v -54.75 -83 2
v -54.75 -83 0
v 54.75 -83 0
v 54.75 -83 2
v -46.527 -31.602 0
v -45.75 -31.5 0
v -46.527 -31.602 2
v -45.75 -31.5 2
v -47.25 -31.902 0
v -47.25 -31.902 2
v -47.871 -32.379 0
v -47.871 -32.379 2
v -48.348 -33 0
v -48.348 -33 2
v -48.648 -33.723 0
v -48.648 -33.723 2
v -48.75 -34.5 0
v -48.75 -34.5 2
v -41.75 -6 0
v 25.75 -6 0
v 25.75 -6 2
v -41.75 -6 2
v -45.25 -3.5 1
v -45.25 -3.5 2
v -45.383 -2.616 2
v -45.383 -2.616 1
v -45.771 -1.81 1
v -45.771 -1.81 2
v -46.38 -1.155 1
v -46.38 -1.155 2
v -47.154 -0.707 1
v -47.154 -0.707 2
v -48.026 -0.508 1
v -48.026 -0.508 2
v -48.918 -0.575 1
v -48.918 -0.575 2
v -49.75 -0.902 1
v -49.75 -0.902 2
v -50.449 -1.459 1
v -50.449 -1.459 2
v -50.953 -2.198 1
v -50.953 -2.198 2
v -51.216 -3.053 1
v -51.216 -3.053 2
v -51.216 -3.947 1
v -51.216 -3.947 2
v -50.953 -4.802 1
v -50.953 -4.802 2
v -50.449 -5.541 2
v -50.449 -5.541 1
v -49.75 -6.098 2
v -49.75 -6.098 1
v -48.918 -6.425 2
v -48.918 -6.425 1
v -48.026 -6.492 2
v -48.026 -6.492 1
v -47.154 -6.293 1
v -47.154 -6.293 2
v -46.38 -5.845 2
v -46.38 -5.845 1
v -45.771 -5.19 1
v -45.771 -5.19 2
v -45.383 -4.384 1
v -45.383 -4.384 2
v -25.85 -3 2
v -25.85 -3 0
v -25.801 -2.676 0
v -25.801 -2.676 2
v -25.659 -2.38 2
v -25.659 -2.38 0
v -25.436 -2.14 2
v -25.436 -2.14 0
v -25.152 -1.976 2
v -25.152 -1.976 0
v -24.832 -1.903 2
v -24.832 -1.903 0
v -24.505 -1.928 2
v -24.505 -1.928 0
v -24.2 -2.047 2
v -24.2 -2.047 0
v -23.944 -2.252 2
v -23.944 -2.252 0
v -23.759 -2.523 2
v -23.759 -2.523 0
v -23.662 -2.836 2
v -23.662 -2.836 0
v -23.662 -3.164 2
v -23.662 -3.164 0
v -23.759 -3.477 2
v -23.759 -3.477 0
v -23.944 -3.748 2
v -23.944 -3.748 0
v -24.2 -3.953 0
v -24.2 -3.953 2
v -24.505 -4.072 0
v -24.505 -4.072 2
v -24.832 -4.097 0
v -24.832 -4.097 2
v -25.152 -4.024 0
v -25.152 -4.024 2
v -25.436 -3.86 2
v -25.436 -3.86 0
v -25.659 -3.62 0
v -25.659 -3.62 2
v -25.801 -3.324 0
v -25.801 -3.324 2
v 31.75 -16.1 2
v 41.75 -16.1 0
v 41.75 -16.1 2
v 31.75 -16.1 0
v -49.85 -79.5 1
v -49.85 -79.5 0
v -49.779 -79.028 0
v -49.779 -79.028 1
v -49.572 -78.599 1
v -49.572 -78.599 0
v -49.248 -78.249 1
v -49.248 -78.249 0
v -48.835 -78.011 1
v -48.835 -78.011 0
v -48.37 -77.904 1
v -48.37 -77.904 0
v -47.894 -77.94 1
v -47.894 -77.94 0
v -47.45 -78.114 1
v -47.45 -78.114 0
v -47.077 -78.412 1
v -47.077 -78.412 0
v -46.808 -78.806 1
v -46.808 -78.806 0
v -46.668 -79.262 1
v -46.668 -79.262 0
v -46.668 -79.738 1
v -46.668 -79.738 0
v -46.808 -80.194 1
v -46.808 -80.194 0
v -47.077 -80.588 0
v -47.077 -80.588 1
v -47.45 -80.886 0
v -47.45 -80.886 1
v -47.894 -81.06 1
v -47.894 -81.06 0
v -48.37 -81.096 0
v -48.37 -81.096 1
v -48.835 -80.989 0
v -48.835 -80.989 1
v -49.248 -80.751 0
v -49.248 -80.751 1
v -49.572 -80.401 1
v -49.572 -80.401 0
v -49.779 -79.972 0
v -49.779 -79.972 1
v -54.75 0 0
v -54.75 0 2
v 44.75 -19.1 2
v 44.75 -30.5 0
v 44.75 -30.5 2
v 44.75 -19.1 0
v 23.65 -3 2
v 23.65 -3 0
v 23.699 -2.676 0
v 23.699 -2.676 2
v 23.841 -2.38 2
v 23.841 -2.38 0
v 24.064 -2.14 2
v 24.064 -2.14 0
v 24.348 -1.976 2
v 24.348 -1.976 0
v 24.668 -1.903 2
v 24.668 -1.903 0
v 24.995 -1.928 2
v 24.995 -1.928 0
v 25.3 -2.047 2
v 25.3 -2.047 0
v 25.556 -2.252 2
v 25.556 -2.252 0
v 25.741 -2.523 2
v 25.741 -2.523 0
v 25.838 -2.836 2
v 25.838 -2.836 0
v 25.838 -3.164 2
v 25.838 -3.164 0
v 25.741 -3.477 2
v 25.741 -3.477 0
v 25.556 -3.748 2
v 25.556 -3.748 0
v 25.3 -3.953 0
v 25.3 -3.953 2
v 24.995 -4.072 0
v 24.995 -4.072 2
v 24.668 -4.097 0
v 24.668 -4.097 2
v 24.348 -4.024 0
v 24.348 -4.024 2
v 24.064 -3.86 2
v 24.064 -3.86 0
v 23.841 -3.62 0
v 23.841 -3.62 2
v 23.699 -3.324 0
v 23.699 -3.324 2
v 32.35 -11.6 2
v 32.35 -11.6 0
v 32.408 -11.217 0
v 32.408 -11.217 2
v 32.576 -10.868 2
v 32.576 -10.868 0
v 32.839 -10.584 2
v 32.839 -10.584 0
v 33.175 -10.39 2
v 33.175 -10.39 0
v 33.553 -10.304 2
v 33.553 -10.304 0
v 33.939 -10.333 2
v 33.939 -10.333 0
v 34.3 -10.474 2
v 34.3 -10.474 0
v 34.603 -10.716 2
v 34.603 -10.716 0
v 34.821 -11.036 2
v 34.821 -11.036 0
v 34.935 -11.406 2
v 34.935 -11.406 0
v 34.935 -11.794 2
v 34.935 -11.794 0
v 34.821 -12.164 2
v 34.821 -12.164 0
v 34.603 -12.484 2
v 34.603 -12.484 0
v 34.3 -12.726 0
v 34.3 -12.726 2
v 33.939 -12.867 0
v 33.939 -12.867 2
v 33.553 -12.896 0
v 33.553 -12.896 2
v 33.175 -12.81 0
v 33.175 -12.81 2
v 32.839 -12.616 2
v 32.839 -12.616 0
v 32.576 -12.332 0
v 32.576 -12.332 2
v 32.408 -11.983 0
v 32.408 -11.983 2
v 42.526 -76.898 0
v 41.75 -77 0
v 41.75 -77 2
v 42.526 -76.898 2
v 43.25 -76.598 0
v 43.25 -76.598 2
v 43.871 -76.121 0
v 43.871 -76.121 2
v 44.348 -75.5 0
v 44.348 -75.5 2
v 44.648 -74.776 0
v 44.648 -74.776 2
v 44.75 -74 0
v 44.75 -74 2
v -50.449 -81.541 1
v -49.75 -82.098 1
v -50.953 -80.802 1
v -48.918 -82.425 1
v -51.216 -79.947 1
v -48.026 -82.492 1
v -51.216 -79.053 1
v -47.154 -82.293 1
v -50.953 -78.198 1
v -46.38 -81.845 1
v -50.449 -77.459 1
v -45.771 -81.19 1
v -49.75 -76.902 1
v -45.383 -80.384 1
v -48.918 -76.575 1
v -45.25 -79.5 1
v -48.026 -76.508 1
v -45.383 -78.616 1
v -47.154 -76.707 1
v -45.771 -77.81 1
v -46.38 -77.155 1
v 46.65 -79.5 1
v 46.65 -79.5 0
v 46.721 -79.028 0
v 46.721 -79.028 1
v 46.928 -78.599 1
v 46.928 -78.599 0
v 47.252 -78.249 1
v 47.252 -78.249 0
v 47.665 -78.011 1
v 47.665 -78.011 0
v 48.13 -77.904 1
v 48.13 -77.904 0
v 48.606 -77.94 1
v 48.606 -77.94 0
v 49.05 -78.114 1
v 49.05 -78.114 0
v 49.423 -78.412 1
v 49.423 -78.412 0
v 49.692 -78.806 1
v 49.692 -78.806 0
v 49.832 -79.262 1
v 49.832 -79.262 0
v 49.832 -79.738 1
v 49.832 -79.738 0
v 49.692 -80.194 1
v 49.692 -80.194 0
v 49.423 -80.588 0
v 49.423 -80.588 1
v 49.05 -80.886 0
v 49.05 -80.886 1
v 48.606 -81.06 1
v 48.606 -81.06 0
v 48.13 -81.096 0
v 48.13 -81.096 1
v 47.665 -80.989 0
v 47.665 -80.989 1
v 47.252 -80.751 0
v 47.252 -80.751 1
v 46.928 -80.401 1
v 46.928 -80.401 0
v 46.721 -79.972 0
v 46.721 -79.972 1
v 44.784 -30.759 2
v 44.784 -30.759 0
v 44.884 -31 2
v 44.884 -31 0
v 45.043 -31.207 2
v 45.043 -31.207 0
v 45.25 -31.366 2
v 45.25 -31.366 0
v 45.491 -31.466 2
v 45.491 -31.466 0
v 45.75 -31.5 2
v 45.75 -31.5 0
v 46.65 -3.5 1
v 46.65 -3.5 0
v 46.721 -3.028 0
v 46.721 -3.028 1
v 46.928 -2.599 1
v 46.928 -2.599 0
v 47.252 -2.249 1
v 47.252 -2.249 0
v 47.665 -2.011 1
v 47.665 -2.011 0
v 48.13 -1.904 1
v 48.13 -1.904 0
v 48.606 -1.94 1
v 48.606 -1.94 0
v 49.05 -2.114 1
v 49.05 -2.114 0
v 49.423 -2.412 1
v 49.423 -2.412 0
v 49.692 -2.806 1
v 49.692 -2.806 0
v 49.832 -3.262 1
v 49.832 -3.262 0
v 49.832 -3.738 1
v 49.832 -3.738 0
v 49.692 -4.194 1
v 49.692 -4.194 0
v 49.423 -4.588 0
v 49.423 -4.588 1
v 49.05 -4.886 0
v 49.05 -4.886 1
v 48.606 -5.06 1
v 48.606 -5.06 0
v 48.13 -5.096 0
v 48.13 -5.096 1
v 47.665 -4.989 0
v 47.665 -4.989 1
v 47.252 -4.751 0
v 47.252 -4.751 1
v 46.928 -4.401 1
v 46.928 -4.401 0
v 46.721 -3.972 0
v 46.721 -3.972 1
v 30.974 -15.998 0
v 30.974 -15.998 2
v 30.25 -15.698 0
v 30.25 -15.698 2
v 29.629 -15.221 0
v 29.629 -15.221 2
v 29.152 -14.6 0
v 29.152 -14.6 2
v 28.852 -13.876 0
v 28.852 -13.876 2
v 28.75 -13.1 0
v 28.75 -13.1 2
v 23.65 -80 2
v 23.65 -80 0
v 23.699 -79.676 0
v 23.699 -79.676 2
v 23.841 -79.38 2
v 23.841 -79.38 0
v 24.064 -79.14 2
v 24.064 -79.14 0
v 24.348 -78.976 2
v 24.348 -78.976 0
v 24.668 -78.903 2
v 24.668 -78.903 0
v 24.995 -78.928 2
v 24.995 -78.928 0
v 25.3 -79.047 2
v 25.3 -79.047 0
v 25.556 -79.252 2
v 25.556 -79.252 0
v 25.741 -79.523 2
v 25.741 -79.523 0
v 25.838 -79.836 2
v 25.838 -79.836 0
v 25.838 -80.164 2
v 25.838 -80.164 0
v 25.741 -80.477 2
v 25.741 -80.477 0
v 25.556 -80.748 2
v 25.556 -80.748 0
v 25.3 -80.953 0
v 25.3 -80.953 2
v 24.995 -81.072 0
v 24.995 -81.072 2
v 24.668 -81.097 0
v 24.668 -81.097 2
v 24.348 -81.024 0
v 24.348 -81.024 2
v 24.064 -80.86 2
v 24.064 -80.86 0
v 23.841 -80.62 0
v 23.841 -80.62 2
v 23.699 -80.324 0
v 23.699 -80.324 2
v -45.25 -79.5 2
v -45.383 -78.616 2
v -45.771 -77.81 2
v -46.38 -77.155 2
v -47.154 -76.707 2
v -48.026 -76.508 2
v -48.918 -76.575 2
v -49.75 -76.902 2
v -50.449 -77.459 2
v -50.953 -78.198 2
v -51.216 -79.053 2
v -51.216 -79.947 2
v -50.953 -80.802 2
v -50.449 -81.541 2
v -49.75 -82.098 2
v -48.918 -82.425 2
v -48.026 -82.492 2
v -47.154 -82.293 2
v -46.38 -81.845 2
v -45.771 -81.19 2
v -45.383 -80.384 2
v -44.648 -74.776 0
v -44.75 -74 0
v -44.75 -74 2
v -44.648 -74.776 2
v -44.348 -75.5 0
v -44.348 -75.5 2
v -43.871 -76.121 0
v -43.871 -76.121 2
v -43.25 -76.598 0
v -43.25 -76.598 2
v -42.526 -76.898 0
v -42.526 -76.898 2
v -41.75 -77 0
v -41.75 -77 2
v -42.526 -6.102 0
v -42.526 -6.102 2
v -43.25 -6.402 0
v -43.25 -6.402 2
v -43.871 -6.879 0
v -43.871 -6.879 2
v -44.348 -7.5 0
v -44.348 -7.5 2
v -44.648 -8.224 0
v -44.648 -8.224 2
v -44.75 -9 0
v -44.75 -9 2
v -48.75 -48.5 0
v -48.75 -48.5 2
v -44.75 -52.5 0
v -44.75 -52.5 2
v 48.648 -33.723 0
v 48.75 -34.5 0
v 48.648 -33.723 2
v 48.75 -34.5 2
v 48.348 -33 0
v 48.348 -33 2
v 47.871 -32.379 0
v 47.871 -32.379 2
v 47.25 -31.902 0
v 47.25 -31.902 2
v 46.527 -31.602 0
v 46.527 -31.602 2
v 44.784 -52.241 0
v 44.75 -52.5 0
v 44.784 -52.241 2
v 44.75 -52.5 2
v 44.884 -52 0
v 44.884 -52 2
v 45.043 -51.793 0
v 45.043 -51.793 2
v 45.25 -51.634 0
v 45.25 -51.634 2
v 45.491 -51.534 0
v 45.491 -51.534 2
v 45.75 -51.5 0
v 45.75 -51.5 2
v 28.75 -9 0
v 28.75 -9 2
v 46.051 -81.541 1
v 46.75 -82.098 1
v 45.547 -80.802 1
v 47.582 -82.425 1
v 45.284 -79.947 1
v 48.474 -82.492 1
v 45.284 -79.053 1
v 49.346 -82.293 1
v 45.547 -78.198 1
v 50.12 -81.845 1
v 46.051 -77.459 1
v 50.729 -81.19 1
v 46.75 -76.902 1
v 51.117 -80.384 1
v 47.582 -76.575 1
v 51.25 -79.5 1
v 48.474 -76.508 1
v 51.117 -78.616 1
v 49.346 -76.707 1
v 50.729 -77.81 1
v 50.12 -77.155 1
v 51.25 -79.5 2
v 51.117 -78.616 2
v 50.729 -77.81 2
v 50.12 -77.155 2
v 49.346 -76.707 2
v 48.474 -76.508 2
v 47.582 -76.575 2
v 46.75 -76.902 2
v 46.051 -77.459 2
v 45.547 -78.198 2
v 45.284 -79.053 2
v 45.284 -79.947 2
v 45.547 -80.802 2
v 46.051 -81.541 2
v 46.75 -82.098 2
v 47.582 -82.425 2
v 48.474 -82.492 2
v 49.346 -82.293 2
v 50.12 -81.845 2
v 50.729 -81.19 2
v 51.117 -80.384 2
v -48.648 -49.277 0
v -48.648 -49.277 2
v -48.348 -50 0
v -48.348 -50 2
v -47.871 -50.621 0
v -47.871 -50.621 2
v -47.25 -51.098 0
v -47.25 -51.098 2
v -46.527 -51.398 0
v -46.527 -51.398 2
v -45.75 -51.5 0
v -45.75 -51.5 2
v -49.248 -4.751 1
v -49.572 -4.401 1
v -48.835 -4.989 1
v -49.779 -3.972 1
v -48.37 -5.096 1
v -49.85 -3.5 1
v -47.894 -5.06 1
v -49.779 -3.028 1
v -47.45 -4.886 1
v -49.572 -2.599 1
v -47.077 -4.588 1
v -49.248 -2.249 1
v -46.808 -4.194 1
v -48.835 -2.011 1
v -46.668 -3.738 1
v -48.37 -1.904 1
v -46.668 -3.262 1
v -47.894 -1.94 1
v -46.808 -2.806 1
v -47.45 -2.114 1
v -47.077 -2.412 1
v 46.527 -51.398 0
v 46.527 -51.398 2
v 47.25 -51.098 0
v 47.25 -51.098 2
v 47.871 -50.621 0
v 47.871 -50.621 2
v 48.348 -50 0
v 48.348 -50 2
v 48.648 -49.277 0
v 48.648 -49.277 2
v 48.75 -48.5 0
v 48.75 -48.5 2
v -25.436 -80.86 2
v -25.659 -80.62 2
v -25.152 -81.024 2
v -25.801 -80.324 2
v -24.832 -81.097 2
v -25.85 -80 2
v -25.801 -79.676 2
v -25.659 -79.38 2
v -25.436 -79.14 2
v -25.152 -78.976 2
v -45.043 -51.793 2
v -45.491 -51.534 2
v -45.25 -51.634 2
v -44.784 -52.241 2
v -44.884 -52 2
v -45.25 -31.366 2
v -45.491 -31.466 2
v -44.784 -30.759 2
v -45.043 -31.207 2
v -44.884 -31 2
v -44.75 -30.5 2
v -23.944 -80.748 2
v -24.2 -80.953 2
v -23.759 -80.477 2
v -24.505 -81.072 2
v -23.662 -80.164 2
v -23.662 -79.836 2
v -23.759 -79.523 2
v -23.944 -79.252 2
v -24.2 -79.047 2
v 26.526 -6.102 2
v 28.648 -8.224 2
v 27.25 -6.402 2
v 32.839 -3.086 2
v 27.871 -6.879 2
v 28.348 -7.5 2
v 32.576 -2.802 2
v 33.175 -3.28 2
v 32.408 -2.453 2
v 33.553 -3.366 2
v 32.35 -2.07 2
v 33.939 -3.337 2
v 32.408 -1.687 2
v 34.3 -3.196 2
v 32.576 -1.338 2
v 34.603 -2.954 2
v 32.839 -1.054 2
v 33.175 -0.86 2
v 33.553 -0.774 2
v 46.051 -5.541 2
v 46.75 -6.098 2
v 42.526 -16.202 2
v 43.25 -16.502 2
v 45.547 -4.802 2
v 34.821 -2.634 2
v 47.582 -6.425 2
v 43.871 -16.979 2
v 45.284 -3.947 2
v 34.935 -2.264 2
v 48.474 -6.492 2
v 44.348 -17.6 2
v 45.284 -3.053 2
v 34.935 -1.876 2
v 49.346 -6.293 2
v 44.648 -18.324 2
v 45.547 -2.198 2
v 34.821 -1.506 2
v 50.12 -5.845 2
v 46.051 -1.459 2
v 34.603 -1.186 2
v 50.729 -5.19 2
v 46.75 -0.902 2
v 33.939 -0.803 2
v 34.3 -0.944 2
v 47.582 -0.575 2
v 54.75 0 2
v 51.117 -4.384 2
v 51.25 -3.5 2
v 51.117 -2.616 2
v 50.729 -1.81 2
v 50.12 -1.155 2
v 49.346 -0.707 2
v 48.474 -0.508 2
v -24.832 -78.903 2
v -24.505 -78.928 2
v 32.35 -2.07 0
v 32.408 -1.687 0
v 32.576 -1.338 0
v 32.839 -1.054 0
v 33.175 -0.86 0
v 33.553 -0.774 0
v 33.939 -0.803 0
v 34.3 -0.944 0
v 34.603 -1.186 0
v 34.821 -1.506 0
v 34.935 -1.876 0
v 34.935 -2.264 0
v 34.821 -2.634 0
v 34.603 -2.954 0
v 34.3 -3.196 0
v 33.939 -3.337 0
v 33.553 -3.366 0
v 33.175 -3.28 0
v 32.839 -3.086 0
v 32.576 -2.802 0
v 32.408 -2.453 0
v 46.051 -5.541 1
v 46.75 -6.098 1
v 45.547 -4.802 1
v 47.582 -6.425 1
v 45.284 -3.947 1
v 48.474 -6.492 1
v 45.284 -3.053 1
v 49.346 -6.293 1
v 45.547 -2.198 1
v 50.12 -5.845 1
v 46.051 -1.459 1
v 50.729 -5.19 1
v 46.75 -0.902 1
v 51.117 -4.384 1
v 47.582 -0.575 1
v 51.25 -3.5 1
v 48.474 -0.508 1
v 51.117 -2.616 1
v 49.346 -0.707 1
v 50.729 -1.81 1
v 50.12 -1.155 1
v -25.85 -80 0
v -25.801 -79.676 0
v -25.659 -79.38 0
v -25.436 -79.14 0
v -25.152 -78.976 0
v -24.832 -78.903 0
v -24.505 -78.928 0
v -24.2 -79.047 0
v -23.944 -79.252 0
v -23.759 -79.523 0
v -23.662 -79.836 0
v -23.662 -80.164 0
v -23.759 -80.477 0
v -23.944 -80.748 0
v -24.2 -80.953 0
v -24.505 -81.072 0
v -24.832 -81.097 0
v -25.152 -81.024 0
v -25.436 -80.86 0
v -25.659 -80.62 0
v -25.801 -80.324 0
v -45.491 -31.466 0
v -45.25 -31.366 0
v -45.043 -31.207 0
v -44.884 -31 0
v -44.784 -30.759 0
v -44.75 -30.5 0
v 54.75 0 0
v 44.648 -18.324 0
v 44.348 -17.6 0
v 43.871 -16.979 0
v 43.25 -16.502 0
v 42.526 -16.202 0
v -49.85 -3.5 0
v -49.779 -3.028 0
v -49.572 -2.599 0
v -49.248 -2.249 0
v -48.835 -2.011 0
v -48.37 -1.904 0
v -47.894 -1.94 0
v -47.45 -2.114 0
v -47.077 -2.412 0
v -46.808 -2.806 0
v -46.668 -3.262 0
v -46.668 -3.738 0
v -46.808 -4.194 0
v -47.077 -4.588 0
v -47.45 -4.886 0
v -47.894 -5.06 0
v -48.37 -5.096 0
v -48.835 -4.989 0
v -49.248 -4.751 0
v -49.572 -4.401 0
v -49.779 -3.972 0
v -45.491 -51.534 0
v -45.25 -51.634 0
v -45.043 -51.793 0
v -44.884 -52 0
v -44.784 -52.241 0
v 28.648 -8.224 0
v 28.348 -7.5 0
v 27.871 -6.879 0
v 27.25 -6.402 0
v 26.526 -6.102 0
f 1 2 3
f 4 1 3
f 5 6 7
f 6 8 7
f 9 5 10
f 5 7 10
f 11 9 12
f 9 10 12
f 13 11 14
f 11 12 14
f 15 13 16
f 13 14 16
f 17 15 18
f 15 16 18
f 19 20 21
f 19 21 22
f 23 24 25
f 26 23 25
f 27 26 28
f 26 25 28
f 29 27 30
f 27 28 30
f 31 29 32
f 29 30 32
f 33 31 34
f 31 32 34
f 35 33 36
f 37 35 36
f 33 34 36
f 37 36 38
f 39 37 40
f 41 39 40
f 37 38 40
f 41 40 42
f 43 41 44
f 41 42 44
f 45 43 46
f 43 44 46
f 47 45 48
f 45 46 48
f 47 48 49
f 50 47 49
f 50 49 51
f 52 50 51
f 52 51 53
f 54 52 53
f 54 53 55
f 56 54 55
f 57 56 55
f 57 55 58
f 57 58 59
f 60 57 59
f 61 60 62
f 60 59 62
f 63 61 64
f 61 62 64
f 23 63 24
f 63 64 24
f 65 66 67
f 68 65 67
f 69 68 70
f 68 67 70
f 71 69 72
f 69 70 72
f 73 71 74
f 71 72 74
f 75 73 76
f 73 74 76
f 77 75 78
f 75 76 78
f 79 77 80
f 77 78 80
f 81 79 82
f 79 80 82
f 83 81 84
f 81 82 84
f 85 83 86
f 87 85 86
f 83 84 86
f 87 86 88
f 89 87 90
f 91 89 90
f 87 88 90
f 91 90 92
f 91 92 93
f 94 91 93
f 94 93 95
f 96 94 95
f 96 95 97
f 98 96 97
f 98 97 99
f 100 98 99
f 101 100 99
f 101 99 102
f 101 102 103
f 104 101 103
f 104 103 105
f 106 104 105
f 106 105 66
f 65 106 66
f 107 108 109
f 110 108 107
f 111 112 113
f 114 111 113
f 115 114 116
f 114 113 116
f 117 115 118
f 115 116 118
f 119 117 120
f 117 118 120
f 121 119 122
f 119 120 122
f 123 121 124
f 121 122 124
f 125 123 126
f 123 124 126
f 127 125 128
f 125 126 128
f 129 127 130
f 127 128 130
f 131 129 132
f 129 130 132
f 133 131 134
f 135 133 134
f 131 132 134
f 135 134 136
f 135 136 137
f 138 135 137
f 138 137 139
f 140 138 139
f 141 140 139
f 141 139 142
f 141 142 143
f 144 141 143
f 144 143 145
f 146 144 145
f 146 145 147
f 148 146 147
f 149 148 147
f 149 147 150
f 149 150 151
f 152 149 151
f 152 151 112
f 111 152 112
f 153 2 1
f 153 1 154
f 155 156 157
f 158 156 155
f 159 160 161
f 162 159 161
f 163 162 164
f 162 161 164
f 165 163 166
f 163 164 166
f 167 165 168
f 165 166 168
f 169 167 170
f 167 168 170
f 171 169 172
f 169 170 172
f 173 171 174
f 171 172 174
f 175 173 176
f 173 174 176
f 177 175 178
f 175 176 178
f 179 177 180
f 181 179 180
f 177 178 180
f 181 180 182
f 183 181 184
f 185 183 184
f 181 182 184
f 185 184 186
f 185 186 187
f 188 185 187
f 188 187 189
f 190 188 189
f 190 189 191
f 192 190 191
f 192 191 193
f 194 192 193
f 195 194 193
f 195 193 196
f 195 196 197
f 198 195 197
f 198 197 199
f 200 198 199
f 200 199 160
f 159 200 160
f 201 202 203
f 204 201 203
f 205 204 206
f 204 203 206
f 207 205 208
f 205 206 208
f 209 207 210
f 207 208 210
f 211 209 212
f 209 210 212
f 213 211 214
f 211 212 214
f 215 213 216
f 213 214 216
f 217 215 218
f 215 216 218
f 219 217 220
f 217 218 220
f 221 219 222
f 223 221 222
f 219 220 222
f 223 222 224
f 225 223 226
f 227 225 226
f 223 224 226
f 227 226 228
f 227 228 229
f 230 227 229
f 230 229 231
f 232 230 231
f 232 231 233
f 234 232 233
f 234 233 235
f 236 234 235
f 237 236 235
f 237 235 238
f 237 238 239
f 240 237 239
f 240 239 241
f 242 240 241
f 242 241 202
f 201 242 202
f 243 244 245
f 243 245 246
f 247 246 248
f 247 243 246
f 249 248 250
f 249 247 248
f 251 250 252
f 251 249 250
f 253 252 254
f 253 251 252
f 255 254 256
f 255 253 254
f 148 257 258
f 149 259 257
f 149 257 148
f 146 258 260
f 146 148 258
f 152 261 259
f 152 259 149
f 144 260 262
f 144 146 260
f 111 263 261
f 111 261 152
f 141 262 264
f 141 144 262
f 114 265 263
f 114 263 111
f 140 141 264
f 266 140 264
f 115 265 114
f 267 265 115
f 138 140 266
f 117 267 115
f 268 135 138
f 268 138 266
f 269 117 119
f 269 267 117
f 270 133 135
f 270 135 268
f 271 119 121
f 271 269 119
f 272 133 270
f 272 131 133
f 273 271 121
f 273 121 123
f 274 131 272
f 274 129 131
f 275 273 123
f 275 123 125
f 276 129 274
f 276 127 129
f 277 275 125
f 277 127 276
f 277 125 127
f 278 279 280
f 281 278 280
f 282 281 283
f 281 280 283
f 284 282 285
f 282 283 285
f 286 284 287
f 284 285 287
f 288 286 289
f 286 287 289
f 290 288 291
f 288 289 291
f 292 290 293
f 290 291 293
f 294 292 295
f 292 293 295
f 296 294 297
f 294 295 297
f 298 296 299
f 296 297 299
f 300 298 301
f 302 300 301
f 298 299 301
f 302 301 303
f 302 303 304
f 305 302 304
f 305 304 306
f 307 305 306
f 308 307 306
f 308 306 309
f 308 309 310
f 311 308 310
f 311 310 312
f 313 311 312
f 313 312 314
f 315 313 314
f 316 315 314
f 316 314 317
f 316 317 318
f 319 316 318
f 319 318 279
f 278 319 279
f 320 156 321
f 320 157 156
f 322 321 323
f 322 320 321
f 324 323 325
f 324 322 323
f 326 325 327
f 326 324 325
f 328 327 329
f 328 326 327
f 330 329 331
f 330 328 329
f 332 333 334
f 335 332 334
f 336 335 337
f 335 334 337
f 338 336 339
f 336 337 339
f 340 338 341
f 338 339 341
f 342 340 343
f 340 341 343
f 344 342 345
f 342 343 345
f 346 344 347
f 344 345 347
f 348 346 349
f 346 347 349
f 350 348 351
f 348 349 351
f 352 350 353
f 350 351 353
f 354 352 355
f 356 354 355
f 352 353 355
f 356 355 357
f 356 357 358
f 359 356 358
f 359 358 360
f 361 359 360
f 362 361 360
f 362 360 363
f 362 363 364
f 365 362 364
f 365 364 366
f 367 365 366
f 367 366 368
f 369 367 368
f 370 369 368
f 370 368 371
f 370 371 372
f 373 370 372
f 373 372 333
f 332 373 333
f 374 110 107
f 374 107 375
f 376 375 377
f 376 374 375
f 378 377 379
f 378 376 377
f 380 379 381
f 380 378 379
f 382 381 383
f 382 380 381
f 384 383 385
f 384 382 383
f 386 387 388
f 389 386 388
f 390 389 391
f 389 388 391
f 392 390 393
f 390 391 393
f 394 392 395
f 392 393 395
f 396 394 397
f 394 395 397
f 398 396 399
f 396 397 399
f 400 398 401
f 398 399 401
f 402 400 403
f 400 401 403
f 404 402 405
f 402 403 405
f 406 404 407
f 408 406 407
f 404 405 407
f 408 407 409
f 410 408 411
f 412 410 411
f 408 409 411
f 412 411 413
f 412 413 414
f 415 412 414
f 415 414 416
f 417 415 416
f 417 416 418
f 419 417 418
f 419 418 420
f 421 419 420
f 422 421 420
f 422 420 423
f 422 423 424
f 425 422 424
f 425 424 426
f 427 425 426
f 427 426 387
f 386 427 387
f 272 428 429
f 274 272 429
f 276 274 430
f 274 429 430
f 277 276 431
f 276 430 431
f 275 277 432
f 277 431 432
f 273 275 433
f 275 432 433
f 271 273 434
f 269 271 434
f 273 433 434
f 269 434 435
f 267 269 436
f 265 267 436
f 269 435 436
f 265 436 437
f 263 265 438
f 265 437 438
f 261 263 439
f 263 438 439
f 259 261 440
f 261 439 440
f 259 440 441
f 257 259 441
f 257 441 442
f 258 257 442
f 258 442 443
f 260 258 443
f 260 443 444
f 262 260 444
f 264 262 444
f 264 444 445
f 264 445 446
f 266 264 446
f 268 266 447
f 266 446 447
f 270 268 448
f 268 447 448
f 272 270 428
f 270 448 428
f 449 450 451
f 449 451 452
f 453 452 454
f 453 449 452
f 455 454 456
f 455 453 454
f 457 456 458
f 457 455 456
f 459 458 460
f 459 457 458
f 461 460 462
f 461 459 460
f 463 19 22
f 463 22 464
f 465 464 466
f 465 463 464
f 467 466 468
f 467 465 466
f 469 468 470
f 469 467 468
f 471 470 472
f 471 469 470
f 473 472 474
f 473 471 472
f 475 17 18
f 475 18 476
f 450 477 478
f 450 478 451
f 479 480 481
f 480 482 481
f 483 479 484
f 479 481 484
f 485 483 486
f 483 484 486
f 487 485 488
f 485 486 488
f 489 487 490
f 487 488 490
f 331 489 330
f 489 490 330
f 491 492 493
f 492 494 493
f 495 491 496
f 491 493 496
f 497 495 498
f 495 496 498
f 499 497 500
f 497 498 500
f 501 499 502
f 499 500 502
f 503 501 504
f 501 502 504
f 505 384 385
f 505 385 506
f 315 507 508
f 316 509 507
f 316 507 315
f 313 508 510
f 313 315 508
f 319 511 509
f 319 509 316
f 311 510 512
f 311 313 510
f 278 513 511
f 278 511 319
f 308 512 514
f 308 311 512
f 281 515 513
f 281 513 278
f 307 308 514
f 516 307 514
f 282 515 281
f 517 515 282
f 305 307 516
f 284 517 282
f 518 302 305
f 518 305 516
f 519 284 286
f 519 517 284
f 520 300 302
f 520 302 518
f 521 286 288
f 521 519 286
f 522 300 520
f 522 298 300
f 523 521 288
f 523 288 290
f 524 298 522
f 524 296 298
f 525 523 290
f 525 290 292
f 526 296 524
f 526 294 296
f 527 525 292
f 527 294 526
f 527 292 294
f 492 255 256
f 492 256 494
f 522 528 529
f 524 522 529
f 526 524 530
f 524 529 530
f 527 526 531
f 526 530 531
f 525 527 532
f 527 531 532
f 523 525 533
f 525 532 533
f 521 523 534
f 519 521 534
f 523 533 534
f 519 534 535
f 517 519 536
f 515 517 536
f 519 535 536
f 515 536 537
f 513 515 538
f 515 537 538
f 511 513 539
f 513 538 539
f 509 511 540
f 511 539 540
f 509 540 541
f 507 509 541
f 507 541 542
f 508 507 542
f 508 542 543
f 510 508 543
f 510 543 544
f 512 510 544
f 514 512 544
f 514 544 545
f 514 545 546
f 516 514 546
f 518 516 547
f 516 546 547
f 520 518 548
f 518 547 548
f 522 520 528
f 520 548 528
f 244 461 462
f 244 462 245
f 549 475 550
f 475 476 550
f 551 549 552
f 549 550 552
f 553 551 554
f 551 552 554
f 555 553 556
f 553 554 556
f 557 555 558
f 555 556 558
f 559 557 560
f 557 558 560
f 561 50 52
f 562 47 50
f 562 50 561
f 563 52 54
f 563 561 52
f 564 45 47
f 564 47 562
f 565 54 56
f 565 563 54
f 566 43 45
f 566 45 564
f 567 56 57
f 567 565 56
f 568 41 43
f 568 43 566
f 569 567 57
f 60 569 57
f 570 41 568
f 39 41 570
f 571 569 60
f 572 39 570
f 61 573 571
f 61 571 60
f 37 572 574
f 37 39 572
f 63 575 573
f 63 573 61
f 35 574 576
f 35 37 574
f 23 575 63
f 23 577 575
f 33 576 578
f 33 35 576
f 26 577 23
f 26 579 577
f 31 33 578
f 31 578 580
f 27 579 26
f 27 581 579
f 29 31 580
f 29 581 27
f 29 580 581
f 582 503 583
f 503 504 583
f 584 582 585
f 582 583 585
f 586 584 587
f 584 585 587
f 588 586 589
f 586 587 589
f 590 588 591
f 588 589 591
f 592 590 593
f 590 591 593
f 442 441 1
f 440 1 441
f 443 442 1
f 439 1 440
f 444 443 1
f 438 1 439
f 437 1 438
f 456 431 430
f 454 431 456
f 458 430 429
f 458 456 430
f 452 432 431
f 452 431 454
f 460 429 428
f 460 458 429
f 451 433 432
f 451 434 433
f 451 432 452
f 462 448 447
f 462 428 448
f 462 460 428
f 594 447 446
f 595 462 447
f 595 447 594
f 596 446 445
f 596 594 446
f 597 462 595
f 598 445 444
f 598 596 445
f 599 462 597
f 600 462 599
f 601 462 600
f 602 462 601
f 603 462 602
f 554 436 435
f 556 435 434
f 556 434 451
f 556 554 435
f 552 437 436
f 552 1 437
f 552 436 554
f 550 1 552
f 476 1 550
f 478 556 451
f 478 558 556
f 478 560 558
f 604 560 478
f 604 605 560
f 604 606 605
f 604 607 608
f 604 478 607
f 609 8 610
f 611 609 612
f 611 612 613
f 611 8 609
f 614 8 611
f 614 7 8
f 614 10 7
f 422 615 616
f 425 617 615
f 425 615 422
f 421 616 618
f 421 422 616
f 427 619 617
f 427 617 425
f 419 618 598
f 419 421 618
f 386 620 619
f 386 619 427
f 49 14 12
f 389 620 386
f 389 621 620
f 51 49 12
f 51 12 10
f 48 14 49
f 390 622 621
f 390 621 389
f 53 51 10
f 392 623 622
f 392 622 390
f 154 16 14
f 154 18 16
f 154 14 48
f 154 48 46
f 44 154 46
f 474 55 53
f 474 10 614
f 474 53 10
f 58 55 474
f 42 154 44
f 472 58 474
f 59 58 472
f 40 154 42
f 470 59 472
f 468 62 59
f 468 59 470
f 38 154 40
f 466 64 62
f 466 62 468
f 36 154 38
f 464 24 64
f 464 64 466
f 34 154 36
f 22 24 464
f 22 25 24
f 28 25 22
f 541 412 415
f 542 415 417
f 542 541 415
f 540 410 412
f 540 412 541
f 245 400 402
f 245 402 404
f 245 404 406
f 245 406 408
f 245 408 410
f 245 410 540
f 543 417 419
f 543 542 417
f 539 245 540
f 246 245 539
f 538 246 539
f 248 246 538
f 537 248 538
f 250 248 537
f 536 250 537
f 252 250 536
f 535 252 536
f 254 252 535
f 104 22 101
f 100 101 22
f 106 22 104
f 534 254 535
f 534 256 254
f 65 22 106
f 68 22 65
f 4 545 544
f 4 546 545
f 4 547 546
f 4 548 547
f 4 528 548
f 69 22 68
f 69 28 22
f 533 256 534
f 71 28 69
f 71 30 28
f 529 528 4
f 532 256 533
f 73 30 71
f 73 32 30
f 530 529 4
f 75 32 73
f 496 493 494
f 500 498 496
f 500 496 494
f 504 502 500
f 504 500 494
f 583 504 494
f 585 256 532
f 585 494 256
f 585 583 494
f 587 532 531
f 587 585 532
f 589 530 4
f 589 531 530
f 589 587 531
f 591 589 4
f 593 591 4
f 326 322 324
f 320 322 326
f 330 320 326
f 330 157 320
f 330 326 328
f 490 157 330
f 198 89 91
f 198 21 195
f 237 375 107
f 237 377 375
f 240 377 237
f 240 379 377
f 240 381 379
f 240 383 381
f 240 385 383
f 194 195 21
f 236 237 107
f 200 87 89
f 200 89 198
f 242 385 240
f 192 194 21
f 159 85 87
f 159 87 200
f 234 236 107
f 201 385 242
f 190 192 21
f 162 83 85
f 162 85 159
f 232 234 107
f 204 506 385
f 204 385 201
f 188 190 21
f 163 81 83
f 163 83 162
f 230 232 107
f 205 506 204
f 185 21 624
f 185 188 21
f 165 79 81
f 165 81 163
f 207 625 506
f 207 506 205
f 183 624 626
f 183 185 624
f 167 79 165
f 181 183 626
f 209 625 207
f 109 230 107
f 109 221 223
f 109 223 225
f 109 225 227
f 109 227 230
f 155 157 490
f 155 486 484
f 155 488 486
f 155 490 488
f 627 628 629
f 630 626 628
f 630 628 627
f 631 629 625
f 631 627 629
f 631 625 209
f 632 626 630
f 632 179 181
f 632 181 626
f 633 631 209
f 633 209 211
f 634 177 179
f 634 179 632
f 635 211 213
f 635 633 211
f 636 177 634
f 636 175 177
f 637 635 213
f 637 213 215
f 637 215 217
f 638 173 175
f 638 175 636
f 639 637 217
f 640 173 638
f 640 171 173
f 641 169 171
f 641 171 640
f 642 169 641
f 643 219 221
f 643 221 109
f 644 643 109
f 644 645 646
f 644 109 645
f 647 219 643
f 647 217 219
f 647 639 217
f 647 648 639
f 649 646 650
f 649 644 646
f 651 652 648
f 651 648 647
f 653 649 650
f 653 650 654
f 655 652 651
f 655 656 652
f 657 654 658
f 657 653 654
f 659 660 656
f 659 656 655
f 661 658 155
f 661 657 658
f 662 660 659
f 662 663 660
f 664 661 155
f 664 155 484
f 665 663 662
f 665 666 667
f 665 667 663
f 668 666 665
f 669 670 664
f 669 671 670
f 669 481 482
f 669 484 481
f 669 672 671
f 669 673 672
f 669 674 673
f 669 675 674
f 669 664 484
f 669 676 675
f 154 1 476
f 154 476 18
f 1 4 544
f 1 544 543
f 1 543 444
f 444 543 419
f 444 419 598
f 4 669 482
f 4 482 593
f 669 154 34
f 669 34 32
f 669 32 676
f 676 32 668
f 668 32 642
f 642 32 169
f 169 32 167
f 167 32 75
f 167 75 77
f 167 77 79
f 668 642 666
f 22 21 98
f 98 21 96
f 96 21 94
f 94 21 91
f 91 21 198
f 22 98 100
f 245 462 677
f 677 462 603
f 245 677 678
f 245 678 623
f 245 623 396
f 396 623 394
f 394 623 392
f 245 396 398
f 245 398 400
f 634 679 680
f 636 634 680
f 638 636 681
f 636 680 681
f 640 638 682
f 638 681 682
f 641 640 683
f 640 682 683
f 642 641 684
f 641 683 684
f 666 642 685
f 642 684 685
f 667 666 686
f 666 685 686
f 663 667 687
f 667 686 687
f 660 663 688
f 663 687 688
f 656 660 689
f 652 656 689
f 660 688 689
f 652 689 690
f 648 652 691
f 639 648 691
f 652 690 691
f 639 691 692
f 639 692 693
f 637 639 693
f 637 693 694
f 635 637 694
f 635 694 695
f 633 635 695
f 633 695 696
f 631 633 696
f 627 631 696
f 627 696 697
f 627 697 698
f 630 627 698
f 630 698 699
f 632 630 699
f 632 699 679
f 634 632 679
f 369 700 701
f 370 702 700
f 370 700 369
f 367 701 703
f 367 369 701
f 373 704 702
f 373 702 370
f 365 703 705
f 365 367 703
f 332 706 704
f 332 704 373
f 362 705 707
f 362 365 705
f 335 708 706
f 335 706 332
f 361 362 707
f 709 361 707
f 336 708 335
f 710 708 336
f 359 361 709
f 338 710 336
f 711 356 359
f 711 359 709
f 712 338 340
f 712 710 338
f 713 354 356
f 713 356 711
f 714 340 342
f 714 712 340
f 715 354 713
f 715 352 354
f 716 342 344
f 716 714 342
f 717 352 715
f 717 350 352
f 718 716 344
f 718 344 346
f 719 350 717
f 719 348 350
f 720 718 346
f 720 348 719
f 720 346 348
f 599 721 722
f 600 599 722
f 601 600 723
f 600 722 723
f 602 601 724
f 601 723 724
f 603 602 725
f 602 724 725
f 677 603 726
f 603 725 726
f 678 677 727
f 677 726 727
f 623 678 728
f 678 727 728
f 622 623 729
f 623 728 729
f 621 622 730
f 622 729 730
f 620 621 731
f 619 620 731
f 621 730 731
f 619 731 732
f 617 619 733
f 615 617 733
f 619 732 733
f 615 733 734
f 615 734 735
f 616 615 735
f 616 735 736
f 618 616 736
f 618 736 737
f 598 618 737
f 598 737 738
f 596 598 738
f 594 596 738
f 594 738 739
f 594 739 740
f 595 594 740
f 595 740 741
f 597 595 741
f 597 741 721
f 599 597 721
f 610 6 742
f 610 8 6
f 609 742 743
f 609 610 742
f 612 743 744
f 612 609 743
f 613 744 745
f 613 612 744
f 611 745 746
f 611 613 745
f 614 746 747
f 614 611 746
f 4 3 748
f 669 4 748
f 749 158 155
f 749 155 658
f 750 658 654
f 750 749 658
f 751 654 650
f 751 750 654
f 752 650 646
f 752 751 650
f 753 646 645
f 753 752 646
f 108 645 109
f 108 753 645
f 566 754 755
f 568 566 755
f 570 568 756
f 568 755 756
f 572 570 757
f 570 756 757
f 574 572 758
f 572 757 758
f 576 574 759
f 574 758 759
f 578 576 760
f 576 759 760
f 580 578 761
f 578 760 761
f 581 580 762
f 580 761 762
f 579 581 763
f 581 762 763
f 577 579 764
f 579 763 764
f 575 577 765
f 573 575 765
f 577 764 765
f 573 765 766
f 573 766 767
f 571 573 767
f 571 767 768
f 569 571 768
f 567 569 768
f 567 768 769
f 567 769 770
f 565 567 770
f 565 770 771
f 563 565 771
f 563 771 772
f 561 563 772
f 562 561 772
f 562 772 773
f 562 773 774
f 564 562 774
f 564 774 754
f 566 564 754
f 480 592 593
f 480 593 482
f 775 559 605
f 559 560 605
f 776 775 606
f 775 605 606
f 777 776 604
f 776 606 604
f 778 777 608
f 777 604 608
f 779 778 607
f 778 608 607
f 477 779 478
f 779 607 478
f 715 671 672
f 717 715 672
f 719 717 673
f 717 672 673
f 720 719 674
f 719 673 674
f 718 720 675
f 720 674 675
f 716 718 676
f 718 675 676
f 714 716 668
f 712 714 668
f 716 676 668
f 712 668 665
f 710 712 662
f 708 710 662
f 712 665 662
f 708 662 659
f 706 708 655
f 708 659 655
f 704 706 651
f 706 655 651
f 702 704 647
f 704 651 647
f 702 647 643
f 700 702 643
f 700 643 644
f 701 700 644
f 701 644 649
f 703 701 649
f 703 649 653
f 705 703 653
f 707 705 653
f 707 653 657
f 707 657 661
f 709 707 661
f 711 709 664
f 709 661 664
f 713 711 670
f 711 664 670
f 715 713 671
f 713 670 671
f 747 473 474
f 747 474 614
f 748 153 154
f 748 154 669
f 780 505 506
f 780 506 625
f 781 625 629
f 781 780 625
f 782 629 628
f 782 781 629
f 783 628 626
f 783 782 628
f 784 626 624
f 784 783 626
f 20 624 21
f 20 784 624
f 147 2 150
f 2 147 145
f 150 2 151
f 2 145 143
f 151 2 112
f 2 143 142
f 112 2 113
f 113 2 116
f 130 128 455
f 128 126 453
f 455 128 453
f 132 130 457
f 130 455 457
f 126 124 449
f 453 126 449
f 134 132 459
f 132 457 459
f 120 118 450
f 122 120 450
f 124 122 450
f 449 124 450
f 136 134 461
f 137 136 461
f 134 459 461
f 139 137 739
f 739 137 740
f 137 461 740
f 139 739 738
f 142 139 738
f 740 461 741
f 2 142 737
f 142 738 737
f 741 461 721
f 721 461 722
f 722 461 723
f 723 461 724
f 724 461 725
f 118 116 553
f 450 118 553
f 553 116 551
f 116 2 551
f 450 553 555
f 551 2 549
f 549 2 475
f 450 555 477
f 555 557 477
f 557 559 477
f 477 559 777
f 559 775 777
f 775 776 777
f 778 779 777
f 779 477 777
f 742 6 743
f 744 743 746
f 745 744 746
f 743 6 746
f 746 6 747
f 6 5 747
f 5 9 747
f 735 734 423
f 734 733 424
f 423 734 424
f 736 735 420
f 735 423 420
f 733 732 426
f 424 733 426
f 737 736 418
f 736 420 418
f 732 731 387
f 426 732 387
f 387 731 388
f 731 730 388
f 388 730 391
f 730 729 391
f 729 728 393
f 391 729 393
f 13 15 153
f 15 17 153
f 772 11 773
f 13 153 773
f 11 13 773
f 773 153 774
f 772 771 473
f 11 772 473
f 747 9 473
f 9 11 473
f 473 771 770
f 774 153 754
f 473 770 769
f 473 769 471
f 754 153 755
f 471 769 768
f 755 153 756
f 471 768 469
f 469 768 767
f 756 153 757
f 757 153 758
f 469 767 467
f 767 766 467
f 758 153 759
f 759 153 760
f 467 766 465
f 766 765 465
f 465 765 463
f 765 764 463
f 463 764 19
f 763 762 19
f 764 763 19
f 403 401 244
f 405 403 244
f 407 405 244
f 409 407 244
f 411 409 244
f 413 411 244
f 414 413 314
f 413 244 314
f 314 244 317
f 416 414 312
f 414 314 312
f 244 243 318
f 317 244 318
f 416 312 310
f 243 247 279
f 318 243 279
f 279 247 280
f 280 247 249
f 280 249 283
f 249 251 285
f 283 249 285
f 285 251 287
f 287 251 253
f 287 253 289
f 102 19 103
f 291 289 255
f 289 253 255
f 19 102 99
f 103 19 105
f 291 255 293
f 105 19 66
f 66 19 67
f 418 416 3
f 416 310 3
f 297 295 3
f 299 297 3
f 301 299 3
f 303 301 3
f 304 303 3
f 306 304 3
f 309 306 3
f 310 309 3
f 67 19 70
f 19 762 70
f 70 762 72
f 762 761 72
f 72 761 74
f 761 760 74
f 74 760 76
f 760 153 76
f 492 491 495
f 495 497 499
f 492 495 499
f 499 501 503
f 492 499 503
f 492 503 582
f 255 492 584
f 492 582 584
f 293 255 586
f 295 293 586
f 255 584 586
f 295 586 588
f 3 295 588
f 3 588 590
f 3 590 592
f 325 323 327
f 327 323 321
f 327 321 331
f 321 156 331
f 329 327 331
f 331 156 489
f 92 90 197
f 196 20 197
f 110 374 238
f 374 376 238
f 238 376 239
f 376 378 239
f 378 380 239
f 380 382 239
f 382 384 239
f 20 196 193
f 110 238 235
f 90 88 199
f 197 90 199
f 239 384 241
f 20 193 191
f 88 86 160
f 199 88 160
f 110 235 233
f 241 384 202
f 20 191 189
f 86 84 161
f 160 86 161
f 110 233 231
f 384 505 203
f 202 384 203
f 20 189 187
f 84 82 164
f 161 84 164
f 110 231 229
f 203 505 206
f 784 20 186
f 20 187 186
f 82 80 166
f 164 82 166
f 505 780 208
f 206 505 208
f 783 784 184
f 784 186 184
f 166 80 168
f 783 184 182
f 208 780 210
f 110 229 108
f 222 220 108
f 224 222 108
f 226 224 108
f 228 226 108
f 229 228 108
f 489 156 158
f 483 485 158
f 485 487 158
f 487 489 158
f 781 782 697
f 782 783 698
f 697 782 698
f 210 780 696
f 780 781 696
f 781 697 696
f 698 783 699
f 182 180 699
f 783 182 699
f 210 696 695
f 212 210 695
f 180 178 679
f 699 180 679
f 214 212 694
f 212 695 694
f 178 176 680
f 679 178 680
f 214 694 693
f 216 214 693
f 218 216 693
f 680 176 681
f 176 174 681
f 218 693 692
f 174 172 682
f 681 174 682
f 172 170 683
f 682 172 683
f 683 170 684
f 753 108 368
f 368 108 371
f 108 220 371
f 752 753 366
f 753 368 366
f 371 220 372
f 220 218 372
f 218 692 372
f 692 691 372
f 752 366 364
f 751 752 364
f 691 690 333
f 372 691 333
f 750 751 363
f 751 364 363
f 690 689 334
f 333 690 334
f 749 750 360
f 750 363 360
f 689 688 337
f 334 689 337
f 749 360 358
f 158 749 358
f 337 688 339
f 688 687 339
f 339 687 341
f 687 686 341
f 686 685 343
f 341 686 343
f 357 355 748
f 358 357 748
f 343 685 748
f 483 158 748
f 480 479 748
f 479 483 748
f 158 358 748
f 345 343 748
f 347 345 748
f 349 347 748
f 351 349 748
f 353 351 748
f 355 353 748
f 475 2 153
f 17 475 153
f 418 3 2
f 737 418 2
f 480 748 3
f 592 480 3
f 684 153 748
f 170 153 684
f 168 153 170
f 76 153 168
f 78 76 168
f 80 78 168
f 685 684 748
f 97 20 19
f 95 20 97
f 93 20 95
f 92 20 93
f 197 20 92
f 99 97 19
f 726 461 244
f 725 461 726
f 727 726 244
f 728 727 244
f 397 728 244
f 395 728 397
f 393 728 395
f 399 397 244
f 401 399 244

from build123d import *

# Parameters (mm, degrees)
SKETCH1_W                  = 109.5
SKETCH1_H                  = 83
BOSS_EXTRUDE1_DEPTH        = 2
F_3_2_3_2_DIAMETER_HOLE2_D = 3.2
F_2_6_2_6_DIAMETER_HOLE2_D = 2.6
F_2_6_2_6_DIAMETER_HOLE1_D = 2.6
SKETCH9_R                  = 3
CUT_EXTRUDE1_DEPTH         = 1
F_2_2_2_2_DIAMETER_HOLE1_D = 2.2
FILLET1_R                  = 1
FILLET2_R                  = 3


with BuildPart() as part:
    # Sketch1 → Boss-Extrude1 (new body)
    with BuildSketch(Plane.XY):
        with Locations((0, -41.5)):
            Rectangle(SKETCH1_W, SKETCH1_H)
        with BuildLine():
            Line((-44.75, -31.5), (-48.75, -31.5))
            Line((-48.75, -31.5), (-48.75, -51.5))
            Line((-48.75, -51.5), (-44.75, -51.5))
            Line((-44.75, -51.5), (-44.75, -74))
            ThreePointArc((-44.75, -74), (-43.871320344, -76.121320344), (-41.75, -77))
            Line((-41.75, -77), (41.75, -77))
            ThreePointArc((41.75, -77), (43.871320344, -76.121320344), (44.75, -74))
            Line((44.75, -74), (44.75, -51.5))
            Line((44.75, -51.5), (48.75, -51.5))
            Line((48.75, -51.5), (48.75, -41.5))
            Line((48.75, -41.5), (48.75, -31.5))
            Line((48.75, -31.5), (44.75, -31.5))
            Line((44.75, -31.5), (44.75, -19.1))
            ThreePointArc((44.75, -19.1), (43.871320344, -16.978679656), (41.75, -16.1))
            Line((41.75, -16.1), (31.75, -16.1))
            ThreePointArc((31.75, -16.1), (29.628679656, -15.221320344), (28.75, -13.1))
            Line((28.75, -13.1), (28.75, -9))
            ThreePointArc((28.75, -9), (27.871320344, -6.878679656), (25.75, -6))
            Line((25.75, -6), (-41.75, -6))
            ThreePointArc((-41.75, -6), (-43.871320344, -6.878679656), (-44.75, -9))
            Line((-44.75, -9), (-44.75, -31.5))
        make_face(mode=Mode.SUBTRACT)
    extrude(amount=BOSS_EXTRUDE1_DEPTH)

    # Ø3.2 (3.2) Diameter Hole2 (through all)
    with Locations(Plane.XY.offset(2)):
        with Locations((-48.25, -3.5), (-48.25, -79.5), (48.25, -79.5), (48.25, -3.5)):
            Hole(F_3_2_3_2_DIAMETER_HOLE2_D / 2)

    # Ø2.6 (2.6) Diameter Hole2 (through all)
    with Locations(Plane.XY.offset(2)):
        with Locations((33.65, -11.6)):
            Hole(F_2_6_2_6_DIAMETER_HOLE2_D / 2)

    # Ø2.6 (2.6) Diameter Hole1 (through all)
    with Locations(Plane.XY.offset(2)):
        with Locations((33.65, -2.07)):
            Hole(F_2_6_2_6_DIAMETER_HOLE1_D / 2)

    # Sketch9 → Cut-Extrude1 (cut)
    with BuildSketch(Plane.XY.offset(2)):
        with Locations((-48.25, -3.5)):
            Circle(SKETCH9_R)
        with Locations((48.25, -3.5)):
            Circle(SKETCH9_R)
        with Locations((48.25, -79.5)):
            Circle(SKETCH9_R)
        with Locations((-48.25, -79.5)):
            Circle(SKETCH9_R)
    extrude(amount=-CUT_EXTRUDE1_DEPTH, mode=Mode.SUBTRACT)

    # Ø2.2 (2.2) Diameter Hole1 (through all)
    with Locations(Plane.XY.offset(2)):
        with Locations((-24.75, -3), (24.75, -3), (-24.75, -80), (24.75, -80)):
            Hole(F_2_2_2_2_DIAMETER_HOLE1_D / 2)

    # Fillet1
    fillet1_edges = [part.edges().sort_by_distance(p)[0] for p in [
        (-44.75, -31.5, 1),
        (-44.75, -51.5, 1),
        (44.75, -51.5, 1),
        (44.75, -31.5, 1),
    ]]
    fillet(fillet1_edges, radius=FILLET1_R)

    # Fillet2
    fillet2_edges = [part.edges().sort_by_distance(p)[0] for p in [
        (48.75, -31.5, 1),
        (48.75, -51.5, 1),
        (-48.75, -51.5, 1),
        (-48.75, -31.5, 1),
    ]]
    fillet(fillet2_edges, radius=FILLET2_R - 0.0001)  # a hair under: the kernel refuses the full size


solid = part.part
